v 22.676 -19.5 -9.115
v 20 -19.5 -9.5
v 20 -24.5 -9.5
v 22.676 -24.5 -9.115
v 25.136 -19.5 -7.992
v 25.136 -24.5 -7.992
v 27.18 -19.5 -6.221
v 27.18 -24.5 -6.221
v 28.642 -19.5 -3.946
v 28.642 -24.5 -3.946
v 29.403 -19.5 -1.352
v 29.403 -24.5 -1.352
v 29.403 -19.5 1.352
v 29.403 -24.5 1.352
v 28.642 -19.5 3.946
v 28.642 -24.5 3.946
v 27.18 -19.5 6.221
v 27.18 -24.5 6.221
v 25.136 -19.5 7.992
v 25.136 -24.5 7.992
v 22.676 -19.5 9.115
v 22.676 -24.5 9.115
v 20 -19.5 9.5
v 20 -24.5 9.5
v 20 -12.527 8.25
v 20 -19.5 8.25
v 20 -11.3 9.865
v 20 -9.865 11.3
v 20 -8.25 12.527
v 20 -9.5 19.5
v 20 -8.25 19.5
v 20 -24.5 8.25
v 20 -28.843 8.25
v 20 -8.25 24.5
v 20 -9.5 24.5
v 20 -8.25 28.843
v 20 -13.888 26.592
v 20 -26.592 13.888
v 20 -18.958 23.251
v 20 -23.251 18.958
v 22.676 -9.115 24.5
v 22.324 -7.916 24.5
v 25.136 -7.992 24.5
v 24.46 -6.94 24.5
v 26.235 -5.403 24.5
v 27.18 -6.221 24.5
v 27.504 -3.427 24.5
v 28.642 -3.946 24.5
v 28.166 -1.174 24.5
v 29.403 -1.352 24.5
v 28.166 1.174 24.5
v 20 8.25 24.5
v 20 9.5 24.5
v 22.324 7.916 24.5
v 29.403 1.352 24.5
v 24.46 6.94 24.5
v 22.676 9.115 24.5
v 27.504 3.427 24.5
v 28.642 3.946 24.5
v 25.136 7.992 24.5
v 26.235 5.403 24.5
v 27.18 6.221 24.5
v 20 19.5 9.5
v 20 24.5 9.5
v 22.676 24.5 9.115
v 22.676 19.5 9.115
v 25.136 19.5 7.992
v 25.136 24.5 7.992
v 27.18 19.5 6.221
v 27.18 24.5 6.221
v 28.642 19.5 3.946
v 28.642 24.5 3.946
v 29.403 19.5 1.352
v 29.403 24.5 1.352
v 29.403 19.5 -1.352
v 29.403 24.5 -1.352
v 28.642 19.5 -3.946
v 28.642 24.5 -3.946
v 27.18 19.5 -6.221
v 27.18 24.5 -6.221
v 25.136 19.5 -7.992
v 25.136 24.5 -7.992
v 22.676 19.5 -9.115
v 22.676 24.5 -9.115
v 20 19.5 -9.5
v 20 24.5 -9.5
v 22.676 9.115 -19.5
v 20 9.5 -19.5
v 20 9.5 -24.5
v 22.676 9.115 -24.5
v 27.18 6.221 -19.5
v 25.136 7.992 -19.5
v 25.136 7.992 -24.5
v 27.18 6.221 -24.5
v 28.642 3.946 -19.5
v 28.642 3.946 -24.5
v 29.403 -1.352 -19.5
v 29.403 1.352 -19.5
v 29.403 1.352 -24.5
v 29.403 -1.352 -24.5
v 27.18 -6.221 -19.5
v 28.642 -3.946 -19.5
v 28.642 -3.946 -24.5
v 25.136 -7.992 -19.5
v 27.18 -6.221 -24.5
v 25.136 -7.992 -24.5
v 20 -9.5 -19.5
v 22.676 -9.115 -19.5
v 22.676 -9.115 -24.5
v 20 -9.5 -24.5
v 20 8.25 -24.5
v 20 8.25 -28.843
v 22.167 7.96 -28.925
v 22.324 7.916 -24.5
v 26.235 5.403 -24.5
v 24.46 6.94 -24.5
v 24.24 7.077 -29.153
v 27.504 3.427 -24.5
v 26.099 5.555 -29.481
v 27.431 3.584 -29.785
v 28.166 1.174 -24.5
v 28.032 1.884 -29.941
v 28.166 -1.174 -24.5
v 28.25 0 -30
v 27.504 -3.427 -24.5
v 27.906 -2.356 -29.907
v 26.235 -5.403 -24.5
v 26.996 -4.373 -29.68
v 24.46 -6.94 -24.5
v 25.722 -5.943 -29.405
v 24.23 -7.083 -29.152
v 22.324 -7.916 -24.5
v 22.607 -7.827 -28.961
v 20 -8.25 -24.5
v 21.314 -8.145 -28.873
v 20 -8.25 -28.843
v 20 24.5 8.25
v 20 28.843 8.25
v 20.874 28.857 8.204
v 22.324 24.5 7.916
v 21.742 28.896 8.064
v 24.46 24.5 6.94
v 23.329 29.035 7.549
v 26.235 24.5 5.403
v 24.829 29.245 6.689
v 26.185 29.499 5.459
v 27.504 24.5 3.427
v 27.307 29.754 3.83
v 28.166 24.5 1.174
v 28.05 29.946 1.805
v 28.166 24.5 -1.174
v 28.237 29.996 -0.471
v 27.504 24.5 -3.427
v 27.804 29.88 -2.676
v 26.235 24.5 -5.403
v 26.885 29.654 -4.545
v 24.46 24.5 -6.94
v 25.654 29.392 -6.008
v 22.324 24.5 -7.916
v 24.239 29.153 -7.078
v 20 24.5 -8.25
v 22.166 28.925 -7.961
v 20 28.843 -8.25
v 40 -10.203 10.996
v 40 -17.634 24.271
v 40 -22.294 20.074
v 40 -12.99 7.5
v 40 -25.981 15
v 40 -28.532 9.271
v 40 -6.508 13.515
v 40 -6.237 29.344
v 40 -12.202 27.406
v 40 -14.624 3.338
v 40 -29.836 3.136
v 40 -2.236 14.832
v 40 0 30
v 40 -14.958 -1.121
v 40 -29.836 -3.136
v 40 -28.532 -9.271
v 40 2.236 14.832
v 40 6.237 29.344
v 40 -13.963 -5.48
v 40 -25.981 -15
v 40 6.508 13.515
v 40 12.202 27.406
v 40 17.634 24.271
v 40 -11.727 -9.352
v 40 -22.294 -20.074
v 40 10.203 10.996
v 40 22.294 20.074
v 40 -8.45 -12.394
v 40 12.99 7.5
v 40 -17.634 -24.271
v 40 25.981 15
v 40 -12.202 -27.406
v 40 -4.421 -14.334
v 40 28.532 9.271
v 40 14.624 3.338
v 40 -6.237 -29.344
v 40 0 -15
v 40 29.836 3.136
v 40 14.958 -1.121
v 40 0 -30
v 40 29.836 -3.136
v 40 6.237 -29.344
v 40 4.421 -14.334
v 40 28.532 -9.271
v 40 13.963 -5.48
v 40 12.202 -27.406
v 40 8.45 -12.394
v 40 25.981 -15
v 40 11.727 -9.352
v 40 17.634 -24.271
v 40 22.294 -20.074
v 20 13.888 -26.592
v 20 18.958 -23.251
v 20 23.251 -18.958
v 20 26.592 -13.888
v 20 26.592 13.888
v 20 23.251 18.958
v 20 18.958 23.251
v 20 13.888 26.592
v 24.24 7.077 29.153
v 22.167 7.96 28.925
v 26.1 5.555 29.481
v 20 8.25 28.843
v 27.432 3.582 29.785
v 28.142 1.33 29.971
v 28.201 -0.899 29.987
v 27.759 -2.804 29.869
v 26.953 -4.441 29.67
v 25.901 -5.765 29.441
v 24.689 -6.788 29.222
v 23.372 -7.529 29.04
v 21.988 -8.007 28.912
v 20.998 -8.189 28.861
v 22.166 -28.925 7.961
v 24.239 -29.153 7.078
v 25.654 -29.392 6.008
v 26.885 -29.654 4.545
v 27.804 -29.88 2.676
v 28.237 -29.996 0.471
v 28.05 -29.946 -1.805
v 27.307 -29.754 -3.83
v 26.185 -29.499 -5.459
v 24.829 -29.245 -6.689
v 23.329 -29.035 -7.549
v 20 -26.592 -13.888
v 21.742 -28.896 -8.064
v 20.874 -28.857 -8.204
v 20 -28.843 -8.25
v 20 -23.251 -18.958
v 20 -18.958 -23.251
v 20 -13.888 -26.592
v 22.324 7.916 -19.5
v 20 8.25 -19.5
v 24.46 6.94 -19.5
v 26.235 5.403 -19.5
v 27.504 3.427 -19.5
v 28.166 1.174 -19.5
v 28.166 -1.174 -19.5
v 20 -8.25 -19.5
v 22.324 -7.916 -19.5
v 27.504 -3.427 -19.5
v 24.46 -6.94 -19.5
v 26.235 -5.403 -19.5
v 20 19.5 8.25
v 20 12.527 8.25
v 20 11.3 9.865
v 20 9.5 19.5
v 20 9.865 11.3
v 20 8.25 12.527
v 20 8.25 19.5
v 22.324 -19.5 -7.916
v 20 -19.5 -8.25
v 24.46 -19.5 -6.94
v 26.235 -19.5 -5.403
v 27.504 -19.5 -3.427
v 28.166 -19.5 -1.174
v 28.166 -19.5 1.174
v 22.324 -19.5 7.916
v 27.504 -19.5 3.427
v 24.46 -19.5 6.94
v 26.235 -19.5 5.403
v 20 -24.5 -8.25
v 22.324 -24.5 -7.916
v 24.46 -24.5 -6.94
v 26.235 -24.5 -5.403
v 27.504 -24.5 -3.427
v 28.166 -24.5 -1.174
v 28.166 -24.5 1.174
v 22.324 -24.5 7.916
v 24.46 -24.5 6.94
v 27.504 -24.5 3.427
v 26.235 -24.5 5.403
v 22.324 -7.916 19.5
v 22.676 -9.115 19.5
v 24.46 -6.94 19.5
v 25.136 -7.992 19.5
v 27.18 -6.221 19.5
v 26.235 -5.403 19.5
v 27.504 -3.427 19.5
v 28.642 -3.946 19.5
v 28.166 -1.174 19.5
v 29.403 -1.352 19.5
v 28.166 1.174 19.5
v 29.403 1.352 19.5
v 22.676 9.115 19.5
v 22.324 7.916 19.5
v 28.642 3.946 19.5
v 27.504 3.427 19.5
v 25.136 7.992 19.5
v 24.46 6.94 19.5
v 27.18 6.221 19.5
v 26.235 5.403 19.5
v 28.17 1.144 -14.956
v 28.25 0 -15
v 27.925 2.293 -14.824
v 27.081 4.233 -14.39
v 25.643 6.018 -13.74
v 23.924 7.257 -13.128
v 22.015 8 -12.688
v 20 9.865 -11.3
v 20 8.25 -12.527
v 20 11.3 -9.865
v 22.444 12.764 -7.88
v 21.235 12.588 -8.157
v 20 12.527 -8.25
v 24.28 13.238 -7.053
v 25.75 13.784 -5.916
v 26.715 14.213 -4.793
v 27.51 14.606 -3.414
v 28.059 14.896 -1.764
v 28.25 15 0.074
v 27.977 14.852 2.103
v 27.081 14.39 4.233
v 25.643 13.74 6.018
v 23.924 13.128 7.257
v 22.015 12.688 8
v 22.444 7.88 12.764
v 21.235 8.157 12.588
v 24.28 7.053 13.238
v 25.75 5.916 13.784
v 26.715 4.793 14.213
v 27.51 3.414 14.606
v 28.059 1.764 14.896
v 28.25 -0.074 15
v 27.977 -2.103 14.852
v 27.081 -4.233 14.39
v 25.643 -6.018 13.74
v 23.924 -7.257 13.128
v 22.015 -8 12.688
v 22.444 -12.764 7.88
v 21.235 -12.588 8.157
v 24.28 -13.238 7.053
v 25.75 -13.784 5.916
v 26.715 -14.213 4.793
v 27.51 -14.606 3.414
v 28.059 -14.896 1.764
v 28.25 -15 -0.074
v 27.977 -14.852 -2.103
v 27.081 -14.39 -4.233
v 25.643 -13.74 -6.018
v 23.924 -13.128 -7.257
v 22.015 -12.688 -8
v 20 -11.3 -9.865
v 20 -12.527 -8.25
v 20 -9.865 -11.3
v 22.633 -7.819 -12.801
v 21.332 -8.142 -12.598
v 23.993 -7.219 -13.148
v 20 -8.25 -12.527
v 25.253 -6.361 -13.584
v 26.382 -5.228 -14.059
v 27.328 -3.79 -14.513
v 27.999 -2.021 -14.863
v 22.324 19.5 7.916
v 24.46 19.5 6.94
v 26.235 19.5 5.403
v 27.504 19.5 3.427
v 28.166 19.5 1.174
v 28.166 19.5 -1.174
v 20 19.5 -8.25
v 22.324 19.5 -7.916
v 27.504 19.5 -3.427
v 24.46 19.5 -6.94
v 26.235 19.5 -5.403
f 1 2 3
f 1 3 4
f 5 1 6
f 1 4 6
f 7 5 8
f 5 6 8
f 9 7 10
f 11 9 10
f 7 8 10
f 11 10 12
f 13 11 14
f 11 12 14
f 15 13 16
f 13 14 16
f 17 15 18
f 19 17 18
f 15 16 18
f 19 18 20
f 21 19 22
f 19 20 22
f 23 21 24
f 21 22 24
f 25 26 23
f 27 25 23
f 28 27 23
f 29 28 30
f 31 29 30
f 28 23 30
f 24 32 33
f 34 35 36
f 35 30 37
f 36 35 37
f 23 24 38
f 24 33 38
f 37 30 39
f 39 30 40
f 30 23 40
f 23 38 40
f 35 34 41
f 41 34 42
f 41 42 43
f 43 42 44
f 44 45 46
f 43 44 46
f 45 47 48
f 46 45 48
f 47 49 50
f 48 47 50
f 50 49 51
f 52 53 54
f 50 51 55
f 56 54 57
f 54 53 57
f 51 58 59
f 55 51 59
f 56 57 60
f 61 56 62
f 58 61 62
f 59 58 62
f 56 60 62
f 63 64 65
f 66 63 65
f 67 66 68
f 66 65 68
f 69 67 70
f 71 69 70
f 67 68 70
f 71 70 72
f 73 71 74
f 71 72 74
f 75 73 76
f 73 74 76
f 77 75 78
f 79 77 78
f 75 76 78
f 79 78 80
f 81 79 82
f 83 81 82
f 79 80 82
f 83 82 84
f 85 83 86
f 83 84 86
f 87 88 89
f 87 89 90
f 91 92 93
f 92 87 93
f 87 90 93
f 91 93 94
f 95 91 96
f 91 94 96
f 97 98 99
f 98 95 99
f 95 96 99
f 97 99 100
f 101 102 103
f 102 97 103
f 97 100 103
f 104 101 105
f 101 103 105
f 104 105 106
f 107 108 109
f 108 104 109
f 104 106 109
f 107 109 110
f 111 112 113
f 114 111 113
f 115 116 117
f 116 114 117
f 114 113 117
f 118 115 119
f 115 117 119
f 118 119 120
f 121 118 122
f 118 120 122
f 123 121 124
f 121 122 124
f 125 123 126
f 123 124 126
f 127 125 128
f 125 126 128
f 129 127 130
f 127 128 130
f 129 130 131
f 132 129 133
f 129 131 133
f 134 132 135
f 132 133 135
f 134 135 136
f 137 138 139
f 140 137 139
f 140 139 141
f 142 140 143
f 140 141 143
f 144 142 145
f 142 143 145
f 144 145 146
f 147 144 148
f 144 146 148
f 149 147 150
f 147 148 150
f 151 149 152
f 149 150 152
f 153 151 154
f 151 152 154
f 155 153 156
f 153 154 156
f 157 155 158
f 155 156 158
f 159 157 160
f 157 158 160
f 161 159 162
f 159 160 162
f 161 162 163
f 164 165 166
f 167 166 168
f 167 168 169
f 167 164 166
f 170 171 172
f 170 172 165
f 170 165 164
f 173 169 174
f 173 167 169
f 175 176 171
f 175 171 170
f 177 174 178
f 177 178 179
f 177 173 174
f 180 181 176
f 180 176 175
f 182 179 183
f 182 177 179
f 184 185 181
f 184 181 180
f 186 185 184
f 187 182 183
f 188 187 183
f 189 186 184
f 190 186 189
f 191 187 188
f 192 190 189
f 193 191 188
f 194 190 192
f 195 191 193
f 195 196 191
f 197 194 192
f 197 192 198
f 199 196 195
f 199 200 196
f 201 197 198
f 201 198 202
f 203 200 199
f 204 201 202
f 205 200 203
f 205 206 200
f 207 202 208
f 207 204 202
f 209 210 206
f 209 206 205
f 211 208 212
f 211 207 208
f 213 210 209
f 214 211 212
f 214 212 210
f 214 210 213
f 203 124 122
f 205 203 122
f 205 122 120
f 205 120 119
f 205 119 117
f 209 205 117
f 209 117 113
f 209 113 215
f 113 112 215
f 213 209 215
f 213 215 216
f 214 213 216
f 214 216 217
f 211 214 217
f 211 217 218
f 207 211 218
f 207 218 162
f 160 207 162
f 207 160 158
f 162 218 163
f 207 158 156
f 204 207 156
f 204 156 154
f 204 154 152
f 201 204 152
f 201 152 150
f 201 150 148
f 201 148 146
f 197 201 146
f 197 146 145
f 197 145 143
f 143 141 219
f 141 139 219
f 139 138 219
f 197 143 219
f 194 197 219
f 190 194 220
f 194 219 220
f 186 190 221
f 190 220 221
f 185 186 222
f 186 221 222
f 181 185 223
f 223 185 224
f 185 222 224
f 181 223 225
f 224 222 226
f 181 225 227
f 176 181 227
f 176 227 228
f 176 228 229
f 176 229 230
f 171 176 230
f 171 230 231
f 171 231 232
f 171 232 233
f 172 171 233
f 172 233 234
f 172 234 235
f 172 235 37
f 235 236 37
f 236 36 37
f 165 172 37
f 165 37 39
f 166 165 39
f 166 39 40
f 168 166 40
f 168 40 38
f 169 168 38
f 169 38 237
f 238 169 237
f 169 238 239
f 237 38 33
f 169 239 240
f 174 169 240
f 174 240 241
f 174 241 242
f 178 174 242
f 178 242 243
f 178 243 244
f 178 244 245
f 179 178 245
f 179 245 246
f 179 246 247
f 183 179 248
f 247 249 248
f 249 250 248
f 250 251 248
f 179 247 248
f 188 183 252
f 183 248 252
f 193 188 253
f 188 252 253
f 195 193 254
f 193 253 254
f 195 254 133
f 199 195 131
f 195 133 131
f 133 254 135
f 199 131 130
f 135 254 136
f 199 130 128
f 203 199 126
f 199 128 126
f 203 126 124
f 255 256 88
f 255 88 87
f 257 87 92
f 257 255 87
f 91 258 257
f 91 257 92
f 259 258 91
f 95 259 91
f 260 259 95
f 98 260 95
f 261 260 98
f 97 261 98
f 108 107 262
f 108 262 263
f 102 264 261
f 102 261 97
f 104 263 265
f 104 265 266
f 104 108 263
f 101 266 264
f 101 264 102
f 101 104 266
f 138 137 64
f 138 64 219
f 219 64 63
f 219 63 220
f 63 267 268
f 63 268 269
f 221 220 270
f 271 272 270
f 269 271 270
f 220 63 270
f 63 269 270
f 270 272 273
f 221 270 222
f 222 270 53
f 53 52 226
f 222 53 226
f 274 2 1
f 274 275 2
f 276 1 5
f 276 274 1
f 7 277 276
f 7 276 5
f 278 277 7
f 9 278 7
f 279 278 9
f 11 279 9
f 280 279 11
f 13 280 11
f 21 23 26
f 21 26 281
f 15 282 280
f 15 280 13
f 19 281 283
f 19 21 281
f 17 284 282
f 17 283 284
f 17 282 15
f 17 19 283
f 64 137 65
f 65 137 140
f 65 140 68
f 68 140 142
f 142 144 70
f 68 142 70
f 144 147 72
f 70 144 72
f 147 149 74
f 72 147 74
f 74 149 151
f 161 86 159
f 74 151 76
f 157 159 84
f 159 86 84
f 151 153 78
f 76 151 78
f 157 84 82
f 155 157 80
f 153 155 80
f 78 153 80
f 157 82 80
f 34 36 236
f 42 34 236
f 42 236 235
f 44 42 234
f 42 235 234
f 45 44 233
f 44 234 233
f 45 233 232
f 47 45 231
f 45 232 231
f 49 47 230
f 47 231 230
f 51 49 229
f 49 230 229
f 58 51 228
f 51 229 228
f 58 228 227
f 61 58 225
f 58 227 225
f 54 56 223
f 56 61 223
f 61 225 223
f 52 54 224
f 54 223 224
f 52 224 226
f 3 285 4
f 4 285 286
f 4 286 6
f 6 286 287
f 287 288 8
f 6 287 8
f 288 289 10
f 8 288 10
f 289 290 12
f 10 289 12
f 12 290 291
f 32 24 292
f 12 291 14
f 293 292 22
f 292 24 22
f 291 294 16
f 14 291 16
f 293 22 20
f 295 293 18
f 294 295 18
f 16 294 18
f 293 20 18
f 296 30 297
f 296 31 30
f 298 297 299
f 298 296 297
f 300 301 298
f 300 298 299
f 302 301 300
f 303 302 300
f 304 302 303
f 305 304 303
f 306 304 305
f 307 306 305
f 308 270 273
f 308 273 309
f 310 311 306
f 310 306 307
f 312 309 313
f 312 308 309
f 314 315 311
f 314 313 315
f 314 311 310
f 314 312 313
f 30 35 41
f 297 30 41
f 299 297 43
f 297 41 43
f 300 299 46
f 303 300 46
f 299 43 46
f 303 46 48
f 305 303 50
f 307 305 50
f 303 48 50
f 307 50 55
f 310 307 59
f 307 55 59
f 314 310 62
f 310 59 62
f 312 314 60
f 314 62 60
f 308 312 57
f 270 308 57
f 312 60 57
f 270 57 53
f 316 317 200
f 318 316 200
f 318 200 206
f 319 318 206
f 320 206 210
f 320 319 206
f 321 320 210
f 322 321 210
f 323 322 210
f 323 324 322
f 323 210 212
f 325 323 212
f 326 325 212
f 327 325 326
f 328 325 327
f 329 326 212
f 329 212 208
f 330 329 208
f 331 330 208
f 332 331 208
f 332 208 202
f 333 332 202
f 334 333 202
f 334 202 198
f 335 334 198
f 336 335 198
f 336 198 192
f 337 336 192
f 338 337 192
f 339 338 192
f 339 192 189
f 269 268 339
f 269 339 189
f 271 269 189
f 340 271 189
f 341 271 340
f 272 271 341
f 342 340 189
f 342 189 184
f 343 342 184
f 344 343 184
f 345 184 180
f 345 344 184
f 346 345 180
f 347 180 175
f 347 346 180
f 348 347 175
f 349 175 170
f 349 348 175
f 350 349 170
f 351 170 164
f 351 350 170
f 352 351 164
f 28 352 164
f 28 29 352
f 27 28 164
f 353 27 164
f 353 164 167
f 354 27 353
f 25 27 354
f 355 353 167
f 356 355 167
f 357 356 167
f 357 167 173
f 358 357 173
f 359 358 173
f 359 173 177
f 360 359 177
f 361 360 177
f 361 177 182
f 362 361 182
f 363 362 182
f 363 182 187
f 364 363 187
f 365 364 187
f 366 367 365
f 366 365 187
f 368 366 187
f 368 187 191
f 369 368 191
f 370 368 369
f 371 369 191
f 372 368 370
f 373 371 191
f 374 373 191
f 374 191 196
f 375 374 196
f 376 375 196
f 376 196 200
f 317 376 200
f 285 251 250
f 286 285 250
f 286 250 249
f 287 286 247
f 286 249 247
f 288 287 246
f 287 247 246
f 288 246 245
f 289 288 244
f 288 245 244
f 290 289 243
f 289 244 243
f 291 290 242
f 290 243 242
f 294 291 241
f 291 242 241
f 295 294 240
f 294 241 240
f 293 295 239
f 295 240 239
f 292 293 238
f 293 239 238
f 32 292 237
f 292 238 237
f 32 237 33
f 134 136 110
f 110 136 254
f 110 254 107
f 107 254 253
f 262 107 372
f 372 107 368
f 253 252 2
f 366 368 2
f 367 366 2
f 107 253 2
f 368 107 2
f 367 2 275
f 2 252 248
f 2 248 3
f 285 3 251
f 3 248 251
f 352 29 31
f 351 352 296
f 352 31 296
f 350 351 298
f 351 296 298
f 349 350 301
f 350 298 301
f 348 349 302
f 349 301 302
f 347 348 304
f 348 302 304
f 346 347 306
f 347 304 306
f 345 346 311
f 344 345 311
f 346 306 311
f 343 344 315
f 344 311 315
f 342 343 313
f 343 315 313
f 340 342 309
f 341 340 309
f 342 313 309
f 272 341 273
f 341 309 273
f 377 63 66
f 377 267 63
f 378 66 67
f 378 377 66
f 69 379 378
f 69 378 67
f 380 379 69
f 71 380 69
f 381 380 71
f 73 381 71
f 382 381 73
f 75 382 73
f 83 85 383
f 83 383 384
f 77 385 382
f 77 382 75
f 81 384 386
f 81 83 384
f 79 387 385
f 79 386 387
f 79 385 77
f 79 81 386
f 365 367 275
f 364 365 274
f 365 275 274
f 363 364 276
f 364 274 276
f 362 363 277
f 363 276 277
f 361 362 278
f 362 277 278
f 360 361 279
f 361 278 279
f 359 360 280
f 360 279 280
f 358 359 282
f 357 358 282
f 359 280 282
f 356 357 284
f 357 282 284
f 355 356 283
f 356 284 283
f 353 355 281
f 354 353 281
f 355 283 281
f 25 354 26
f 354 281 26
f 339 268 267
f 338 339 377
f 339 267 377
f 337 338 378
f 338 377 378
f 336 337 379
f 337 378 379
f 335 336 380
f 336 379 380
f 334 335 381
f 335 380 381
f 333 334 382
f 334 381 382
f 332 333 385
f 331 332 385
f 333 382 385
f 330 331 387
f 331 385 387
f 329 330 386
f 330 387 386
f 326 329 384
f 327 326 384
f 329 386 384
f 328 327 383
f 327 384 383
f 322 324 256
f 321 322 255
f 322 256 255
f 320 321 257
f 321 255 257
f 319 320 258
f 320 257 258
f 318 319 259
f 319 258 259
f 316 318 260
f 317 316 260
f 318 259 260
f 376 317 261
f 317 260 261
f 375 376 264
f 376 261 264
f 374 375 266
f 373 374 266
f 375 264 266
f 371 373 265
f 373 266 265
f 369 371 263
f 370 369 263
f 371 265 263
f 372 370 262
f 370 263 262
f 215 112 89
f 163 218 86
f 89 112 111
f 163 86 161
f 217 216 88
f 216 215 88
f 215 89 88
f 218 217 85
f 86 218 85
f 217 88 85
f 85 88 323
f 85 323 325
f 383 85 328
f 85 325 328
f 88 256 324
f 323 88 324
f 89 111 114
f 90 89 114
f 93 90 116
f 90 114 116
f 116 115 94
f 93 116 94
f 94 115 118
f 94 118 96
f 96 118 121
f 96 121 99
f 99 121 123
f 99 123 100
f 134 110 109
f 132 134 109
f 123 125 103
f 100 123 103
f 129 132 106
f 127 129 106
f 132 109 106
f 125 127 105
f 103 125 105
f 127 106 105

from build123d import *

# Parameters (mm, degrees)
SKETCH1_R           = 30
SKETCH1_R_2         = 15
BOSS_EXTRUDE1_DEPTH = 40
SKETCH2_R           = 9.5
CUT_EXTRUDE1_DEPTH  = 2.5
SKETCH3_R           = 8.25
CUT_EXTRUDE2_DEPTH  = 15
CIRPATTERN1_COUNT   = 4


with BuildPart() as part:
    # Sketch1 → Boss-Extrude1 (new body)
    with BuildSketch(Plane(origin=(0, 0, 0), x_dir=(0, 0, -1), z_dir=(1, 0, 0))):
        Circle(SKETCH1_R)
        Circle(SKETCH1_R_2, mode=Mode.SUBTRACT)
    extrude(amount=BOSS_EXTRUDE1_DEPTH)

    # Sketch2 → Cut-Extrude1 (cut, symmetric)
    with BuildSketch(Plane.XY.offset(22)):
        with Locations((20, 0)):
            Circle(SKETCH2_R)
    cut_extrude1 = extrude(amount=CUT_EXTRUDE1_DEPTH, both=True, mode=Mode.SUBTRACT)

    # Sketch3 → Cut-Extrude2 (cut, symmetric)
    with BuildSketch(Plane.XY.offset(22)):
        with Locations((20, 0)):
            Circle(SKETCH3_R)
    cut_extrude2 = extrude(amount=CUT_EXTRUDE2_DEPTH, both=True, mode=Mode.SUBTRACT)

    # CirPattern1: Cut-Extrude1, Cut-Extrude2 ×4 about axis
    cirpattern1_axis = Axis((0, 0, 0), (1, 0, 0))
    for i in range(1, CIRPATTERN1_COUNT):
        add(cut_extrude1.rotate(cirpattern1_axis, i * 360 / CIRPATTERN1_COUNT), mode=Mode.SUBTRACT)
        add(cut_extrude2.rotate(cirpattern1_axis, i * 360 / CIRPATTERN1_COUNT), mode=Mode.SUBTRACT)


with BuildPart() as body_2:
    # Split2: the piece on the far side of the plane
    add(part.part)
    split(bisect_by=Plane(origin=(20, 0, 0), x_dir=(0, 0, 1), z_dir=(1, 0, 0)), keep=Keep.BOTTOM)


with BuildPart() as part_1:
    add(part.part)

    # Split2
    split(bisect_by=Plane(origin=(20, 0, 0), x_dir=(0, 0, 1), z_dir=(1, 0, 0)), keep=Keep.TOP)


solid = part_1.part
